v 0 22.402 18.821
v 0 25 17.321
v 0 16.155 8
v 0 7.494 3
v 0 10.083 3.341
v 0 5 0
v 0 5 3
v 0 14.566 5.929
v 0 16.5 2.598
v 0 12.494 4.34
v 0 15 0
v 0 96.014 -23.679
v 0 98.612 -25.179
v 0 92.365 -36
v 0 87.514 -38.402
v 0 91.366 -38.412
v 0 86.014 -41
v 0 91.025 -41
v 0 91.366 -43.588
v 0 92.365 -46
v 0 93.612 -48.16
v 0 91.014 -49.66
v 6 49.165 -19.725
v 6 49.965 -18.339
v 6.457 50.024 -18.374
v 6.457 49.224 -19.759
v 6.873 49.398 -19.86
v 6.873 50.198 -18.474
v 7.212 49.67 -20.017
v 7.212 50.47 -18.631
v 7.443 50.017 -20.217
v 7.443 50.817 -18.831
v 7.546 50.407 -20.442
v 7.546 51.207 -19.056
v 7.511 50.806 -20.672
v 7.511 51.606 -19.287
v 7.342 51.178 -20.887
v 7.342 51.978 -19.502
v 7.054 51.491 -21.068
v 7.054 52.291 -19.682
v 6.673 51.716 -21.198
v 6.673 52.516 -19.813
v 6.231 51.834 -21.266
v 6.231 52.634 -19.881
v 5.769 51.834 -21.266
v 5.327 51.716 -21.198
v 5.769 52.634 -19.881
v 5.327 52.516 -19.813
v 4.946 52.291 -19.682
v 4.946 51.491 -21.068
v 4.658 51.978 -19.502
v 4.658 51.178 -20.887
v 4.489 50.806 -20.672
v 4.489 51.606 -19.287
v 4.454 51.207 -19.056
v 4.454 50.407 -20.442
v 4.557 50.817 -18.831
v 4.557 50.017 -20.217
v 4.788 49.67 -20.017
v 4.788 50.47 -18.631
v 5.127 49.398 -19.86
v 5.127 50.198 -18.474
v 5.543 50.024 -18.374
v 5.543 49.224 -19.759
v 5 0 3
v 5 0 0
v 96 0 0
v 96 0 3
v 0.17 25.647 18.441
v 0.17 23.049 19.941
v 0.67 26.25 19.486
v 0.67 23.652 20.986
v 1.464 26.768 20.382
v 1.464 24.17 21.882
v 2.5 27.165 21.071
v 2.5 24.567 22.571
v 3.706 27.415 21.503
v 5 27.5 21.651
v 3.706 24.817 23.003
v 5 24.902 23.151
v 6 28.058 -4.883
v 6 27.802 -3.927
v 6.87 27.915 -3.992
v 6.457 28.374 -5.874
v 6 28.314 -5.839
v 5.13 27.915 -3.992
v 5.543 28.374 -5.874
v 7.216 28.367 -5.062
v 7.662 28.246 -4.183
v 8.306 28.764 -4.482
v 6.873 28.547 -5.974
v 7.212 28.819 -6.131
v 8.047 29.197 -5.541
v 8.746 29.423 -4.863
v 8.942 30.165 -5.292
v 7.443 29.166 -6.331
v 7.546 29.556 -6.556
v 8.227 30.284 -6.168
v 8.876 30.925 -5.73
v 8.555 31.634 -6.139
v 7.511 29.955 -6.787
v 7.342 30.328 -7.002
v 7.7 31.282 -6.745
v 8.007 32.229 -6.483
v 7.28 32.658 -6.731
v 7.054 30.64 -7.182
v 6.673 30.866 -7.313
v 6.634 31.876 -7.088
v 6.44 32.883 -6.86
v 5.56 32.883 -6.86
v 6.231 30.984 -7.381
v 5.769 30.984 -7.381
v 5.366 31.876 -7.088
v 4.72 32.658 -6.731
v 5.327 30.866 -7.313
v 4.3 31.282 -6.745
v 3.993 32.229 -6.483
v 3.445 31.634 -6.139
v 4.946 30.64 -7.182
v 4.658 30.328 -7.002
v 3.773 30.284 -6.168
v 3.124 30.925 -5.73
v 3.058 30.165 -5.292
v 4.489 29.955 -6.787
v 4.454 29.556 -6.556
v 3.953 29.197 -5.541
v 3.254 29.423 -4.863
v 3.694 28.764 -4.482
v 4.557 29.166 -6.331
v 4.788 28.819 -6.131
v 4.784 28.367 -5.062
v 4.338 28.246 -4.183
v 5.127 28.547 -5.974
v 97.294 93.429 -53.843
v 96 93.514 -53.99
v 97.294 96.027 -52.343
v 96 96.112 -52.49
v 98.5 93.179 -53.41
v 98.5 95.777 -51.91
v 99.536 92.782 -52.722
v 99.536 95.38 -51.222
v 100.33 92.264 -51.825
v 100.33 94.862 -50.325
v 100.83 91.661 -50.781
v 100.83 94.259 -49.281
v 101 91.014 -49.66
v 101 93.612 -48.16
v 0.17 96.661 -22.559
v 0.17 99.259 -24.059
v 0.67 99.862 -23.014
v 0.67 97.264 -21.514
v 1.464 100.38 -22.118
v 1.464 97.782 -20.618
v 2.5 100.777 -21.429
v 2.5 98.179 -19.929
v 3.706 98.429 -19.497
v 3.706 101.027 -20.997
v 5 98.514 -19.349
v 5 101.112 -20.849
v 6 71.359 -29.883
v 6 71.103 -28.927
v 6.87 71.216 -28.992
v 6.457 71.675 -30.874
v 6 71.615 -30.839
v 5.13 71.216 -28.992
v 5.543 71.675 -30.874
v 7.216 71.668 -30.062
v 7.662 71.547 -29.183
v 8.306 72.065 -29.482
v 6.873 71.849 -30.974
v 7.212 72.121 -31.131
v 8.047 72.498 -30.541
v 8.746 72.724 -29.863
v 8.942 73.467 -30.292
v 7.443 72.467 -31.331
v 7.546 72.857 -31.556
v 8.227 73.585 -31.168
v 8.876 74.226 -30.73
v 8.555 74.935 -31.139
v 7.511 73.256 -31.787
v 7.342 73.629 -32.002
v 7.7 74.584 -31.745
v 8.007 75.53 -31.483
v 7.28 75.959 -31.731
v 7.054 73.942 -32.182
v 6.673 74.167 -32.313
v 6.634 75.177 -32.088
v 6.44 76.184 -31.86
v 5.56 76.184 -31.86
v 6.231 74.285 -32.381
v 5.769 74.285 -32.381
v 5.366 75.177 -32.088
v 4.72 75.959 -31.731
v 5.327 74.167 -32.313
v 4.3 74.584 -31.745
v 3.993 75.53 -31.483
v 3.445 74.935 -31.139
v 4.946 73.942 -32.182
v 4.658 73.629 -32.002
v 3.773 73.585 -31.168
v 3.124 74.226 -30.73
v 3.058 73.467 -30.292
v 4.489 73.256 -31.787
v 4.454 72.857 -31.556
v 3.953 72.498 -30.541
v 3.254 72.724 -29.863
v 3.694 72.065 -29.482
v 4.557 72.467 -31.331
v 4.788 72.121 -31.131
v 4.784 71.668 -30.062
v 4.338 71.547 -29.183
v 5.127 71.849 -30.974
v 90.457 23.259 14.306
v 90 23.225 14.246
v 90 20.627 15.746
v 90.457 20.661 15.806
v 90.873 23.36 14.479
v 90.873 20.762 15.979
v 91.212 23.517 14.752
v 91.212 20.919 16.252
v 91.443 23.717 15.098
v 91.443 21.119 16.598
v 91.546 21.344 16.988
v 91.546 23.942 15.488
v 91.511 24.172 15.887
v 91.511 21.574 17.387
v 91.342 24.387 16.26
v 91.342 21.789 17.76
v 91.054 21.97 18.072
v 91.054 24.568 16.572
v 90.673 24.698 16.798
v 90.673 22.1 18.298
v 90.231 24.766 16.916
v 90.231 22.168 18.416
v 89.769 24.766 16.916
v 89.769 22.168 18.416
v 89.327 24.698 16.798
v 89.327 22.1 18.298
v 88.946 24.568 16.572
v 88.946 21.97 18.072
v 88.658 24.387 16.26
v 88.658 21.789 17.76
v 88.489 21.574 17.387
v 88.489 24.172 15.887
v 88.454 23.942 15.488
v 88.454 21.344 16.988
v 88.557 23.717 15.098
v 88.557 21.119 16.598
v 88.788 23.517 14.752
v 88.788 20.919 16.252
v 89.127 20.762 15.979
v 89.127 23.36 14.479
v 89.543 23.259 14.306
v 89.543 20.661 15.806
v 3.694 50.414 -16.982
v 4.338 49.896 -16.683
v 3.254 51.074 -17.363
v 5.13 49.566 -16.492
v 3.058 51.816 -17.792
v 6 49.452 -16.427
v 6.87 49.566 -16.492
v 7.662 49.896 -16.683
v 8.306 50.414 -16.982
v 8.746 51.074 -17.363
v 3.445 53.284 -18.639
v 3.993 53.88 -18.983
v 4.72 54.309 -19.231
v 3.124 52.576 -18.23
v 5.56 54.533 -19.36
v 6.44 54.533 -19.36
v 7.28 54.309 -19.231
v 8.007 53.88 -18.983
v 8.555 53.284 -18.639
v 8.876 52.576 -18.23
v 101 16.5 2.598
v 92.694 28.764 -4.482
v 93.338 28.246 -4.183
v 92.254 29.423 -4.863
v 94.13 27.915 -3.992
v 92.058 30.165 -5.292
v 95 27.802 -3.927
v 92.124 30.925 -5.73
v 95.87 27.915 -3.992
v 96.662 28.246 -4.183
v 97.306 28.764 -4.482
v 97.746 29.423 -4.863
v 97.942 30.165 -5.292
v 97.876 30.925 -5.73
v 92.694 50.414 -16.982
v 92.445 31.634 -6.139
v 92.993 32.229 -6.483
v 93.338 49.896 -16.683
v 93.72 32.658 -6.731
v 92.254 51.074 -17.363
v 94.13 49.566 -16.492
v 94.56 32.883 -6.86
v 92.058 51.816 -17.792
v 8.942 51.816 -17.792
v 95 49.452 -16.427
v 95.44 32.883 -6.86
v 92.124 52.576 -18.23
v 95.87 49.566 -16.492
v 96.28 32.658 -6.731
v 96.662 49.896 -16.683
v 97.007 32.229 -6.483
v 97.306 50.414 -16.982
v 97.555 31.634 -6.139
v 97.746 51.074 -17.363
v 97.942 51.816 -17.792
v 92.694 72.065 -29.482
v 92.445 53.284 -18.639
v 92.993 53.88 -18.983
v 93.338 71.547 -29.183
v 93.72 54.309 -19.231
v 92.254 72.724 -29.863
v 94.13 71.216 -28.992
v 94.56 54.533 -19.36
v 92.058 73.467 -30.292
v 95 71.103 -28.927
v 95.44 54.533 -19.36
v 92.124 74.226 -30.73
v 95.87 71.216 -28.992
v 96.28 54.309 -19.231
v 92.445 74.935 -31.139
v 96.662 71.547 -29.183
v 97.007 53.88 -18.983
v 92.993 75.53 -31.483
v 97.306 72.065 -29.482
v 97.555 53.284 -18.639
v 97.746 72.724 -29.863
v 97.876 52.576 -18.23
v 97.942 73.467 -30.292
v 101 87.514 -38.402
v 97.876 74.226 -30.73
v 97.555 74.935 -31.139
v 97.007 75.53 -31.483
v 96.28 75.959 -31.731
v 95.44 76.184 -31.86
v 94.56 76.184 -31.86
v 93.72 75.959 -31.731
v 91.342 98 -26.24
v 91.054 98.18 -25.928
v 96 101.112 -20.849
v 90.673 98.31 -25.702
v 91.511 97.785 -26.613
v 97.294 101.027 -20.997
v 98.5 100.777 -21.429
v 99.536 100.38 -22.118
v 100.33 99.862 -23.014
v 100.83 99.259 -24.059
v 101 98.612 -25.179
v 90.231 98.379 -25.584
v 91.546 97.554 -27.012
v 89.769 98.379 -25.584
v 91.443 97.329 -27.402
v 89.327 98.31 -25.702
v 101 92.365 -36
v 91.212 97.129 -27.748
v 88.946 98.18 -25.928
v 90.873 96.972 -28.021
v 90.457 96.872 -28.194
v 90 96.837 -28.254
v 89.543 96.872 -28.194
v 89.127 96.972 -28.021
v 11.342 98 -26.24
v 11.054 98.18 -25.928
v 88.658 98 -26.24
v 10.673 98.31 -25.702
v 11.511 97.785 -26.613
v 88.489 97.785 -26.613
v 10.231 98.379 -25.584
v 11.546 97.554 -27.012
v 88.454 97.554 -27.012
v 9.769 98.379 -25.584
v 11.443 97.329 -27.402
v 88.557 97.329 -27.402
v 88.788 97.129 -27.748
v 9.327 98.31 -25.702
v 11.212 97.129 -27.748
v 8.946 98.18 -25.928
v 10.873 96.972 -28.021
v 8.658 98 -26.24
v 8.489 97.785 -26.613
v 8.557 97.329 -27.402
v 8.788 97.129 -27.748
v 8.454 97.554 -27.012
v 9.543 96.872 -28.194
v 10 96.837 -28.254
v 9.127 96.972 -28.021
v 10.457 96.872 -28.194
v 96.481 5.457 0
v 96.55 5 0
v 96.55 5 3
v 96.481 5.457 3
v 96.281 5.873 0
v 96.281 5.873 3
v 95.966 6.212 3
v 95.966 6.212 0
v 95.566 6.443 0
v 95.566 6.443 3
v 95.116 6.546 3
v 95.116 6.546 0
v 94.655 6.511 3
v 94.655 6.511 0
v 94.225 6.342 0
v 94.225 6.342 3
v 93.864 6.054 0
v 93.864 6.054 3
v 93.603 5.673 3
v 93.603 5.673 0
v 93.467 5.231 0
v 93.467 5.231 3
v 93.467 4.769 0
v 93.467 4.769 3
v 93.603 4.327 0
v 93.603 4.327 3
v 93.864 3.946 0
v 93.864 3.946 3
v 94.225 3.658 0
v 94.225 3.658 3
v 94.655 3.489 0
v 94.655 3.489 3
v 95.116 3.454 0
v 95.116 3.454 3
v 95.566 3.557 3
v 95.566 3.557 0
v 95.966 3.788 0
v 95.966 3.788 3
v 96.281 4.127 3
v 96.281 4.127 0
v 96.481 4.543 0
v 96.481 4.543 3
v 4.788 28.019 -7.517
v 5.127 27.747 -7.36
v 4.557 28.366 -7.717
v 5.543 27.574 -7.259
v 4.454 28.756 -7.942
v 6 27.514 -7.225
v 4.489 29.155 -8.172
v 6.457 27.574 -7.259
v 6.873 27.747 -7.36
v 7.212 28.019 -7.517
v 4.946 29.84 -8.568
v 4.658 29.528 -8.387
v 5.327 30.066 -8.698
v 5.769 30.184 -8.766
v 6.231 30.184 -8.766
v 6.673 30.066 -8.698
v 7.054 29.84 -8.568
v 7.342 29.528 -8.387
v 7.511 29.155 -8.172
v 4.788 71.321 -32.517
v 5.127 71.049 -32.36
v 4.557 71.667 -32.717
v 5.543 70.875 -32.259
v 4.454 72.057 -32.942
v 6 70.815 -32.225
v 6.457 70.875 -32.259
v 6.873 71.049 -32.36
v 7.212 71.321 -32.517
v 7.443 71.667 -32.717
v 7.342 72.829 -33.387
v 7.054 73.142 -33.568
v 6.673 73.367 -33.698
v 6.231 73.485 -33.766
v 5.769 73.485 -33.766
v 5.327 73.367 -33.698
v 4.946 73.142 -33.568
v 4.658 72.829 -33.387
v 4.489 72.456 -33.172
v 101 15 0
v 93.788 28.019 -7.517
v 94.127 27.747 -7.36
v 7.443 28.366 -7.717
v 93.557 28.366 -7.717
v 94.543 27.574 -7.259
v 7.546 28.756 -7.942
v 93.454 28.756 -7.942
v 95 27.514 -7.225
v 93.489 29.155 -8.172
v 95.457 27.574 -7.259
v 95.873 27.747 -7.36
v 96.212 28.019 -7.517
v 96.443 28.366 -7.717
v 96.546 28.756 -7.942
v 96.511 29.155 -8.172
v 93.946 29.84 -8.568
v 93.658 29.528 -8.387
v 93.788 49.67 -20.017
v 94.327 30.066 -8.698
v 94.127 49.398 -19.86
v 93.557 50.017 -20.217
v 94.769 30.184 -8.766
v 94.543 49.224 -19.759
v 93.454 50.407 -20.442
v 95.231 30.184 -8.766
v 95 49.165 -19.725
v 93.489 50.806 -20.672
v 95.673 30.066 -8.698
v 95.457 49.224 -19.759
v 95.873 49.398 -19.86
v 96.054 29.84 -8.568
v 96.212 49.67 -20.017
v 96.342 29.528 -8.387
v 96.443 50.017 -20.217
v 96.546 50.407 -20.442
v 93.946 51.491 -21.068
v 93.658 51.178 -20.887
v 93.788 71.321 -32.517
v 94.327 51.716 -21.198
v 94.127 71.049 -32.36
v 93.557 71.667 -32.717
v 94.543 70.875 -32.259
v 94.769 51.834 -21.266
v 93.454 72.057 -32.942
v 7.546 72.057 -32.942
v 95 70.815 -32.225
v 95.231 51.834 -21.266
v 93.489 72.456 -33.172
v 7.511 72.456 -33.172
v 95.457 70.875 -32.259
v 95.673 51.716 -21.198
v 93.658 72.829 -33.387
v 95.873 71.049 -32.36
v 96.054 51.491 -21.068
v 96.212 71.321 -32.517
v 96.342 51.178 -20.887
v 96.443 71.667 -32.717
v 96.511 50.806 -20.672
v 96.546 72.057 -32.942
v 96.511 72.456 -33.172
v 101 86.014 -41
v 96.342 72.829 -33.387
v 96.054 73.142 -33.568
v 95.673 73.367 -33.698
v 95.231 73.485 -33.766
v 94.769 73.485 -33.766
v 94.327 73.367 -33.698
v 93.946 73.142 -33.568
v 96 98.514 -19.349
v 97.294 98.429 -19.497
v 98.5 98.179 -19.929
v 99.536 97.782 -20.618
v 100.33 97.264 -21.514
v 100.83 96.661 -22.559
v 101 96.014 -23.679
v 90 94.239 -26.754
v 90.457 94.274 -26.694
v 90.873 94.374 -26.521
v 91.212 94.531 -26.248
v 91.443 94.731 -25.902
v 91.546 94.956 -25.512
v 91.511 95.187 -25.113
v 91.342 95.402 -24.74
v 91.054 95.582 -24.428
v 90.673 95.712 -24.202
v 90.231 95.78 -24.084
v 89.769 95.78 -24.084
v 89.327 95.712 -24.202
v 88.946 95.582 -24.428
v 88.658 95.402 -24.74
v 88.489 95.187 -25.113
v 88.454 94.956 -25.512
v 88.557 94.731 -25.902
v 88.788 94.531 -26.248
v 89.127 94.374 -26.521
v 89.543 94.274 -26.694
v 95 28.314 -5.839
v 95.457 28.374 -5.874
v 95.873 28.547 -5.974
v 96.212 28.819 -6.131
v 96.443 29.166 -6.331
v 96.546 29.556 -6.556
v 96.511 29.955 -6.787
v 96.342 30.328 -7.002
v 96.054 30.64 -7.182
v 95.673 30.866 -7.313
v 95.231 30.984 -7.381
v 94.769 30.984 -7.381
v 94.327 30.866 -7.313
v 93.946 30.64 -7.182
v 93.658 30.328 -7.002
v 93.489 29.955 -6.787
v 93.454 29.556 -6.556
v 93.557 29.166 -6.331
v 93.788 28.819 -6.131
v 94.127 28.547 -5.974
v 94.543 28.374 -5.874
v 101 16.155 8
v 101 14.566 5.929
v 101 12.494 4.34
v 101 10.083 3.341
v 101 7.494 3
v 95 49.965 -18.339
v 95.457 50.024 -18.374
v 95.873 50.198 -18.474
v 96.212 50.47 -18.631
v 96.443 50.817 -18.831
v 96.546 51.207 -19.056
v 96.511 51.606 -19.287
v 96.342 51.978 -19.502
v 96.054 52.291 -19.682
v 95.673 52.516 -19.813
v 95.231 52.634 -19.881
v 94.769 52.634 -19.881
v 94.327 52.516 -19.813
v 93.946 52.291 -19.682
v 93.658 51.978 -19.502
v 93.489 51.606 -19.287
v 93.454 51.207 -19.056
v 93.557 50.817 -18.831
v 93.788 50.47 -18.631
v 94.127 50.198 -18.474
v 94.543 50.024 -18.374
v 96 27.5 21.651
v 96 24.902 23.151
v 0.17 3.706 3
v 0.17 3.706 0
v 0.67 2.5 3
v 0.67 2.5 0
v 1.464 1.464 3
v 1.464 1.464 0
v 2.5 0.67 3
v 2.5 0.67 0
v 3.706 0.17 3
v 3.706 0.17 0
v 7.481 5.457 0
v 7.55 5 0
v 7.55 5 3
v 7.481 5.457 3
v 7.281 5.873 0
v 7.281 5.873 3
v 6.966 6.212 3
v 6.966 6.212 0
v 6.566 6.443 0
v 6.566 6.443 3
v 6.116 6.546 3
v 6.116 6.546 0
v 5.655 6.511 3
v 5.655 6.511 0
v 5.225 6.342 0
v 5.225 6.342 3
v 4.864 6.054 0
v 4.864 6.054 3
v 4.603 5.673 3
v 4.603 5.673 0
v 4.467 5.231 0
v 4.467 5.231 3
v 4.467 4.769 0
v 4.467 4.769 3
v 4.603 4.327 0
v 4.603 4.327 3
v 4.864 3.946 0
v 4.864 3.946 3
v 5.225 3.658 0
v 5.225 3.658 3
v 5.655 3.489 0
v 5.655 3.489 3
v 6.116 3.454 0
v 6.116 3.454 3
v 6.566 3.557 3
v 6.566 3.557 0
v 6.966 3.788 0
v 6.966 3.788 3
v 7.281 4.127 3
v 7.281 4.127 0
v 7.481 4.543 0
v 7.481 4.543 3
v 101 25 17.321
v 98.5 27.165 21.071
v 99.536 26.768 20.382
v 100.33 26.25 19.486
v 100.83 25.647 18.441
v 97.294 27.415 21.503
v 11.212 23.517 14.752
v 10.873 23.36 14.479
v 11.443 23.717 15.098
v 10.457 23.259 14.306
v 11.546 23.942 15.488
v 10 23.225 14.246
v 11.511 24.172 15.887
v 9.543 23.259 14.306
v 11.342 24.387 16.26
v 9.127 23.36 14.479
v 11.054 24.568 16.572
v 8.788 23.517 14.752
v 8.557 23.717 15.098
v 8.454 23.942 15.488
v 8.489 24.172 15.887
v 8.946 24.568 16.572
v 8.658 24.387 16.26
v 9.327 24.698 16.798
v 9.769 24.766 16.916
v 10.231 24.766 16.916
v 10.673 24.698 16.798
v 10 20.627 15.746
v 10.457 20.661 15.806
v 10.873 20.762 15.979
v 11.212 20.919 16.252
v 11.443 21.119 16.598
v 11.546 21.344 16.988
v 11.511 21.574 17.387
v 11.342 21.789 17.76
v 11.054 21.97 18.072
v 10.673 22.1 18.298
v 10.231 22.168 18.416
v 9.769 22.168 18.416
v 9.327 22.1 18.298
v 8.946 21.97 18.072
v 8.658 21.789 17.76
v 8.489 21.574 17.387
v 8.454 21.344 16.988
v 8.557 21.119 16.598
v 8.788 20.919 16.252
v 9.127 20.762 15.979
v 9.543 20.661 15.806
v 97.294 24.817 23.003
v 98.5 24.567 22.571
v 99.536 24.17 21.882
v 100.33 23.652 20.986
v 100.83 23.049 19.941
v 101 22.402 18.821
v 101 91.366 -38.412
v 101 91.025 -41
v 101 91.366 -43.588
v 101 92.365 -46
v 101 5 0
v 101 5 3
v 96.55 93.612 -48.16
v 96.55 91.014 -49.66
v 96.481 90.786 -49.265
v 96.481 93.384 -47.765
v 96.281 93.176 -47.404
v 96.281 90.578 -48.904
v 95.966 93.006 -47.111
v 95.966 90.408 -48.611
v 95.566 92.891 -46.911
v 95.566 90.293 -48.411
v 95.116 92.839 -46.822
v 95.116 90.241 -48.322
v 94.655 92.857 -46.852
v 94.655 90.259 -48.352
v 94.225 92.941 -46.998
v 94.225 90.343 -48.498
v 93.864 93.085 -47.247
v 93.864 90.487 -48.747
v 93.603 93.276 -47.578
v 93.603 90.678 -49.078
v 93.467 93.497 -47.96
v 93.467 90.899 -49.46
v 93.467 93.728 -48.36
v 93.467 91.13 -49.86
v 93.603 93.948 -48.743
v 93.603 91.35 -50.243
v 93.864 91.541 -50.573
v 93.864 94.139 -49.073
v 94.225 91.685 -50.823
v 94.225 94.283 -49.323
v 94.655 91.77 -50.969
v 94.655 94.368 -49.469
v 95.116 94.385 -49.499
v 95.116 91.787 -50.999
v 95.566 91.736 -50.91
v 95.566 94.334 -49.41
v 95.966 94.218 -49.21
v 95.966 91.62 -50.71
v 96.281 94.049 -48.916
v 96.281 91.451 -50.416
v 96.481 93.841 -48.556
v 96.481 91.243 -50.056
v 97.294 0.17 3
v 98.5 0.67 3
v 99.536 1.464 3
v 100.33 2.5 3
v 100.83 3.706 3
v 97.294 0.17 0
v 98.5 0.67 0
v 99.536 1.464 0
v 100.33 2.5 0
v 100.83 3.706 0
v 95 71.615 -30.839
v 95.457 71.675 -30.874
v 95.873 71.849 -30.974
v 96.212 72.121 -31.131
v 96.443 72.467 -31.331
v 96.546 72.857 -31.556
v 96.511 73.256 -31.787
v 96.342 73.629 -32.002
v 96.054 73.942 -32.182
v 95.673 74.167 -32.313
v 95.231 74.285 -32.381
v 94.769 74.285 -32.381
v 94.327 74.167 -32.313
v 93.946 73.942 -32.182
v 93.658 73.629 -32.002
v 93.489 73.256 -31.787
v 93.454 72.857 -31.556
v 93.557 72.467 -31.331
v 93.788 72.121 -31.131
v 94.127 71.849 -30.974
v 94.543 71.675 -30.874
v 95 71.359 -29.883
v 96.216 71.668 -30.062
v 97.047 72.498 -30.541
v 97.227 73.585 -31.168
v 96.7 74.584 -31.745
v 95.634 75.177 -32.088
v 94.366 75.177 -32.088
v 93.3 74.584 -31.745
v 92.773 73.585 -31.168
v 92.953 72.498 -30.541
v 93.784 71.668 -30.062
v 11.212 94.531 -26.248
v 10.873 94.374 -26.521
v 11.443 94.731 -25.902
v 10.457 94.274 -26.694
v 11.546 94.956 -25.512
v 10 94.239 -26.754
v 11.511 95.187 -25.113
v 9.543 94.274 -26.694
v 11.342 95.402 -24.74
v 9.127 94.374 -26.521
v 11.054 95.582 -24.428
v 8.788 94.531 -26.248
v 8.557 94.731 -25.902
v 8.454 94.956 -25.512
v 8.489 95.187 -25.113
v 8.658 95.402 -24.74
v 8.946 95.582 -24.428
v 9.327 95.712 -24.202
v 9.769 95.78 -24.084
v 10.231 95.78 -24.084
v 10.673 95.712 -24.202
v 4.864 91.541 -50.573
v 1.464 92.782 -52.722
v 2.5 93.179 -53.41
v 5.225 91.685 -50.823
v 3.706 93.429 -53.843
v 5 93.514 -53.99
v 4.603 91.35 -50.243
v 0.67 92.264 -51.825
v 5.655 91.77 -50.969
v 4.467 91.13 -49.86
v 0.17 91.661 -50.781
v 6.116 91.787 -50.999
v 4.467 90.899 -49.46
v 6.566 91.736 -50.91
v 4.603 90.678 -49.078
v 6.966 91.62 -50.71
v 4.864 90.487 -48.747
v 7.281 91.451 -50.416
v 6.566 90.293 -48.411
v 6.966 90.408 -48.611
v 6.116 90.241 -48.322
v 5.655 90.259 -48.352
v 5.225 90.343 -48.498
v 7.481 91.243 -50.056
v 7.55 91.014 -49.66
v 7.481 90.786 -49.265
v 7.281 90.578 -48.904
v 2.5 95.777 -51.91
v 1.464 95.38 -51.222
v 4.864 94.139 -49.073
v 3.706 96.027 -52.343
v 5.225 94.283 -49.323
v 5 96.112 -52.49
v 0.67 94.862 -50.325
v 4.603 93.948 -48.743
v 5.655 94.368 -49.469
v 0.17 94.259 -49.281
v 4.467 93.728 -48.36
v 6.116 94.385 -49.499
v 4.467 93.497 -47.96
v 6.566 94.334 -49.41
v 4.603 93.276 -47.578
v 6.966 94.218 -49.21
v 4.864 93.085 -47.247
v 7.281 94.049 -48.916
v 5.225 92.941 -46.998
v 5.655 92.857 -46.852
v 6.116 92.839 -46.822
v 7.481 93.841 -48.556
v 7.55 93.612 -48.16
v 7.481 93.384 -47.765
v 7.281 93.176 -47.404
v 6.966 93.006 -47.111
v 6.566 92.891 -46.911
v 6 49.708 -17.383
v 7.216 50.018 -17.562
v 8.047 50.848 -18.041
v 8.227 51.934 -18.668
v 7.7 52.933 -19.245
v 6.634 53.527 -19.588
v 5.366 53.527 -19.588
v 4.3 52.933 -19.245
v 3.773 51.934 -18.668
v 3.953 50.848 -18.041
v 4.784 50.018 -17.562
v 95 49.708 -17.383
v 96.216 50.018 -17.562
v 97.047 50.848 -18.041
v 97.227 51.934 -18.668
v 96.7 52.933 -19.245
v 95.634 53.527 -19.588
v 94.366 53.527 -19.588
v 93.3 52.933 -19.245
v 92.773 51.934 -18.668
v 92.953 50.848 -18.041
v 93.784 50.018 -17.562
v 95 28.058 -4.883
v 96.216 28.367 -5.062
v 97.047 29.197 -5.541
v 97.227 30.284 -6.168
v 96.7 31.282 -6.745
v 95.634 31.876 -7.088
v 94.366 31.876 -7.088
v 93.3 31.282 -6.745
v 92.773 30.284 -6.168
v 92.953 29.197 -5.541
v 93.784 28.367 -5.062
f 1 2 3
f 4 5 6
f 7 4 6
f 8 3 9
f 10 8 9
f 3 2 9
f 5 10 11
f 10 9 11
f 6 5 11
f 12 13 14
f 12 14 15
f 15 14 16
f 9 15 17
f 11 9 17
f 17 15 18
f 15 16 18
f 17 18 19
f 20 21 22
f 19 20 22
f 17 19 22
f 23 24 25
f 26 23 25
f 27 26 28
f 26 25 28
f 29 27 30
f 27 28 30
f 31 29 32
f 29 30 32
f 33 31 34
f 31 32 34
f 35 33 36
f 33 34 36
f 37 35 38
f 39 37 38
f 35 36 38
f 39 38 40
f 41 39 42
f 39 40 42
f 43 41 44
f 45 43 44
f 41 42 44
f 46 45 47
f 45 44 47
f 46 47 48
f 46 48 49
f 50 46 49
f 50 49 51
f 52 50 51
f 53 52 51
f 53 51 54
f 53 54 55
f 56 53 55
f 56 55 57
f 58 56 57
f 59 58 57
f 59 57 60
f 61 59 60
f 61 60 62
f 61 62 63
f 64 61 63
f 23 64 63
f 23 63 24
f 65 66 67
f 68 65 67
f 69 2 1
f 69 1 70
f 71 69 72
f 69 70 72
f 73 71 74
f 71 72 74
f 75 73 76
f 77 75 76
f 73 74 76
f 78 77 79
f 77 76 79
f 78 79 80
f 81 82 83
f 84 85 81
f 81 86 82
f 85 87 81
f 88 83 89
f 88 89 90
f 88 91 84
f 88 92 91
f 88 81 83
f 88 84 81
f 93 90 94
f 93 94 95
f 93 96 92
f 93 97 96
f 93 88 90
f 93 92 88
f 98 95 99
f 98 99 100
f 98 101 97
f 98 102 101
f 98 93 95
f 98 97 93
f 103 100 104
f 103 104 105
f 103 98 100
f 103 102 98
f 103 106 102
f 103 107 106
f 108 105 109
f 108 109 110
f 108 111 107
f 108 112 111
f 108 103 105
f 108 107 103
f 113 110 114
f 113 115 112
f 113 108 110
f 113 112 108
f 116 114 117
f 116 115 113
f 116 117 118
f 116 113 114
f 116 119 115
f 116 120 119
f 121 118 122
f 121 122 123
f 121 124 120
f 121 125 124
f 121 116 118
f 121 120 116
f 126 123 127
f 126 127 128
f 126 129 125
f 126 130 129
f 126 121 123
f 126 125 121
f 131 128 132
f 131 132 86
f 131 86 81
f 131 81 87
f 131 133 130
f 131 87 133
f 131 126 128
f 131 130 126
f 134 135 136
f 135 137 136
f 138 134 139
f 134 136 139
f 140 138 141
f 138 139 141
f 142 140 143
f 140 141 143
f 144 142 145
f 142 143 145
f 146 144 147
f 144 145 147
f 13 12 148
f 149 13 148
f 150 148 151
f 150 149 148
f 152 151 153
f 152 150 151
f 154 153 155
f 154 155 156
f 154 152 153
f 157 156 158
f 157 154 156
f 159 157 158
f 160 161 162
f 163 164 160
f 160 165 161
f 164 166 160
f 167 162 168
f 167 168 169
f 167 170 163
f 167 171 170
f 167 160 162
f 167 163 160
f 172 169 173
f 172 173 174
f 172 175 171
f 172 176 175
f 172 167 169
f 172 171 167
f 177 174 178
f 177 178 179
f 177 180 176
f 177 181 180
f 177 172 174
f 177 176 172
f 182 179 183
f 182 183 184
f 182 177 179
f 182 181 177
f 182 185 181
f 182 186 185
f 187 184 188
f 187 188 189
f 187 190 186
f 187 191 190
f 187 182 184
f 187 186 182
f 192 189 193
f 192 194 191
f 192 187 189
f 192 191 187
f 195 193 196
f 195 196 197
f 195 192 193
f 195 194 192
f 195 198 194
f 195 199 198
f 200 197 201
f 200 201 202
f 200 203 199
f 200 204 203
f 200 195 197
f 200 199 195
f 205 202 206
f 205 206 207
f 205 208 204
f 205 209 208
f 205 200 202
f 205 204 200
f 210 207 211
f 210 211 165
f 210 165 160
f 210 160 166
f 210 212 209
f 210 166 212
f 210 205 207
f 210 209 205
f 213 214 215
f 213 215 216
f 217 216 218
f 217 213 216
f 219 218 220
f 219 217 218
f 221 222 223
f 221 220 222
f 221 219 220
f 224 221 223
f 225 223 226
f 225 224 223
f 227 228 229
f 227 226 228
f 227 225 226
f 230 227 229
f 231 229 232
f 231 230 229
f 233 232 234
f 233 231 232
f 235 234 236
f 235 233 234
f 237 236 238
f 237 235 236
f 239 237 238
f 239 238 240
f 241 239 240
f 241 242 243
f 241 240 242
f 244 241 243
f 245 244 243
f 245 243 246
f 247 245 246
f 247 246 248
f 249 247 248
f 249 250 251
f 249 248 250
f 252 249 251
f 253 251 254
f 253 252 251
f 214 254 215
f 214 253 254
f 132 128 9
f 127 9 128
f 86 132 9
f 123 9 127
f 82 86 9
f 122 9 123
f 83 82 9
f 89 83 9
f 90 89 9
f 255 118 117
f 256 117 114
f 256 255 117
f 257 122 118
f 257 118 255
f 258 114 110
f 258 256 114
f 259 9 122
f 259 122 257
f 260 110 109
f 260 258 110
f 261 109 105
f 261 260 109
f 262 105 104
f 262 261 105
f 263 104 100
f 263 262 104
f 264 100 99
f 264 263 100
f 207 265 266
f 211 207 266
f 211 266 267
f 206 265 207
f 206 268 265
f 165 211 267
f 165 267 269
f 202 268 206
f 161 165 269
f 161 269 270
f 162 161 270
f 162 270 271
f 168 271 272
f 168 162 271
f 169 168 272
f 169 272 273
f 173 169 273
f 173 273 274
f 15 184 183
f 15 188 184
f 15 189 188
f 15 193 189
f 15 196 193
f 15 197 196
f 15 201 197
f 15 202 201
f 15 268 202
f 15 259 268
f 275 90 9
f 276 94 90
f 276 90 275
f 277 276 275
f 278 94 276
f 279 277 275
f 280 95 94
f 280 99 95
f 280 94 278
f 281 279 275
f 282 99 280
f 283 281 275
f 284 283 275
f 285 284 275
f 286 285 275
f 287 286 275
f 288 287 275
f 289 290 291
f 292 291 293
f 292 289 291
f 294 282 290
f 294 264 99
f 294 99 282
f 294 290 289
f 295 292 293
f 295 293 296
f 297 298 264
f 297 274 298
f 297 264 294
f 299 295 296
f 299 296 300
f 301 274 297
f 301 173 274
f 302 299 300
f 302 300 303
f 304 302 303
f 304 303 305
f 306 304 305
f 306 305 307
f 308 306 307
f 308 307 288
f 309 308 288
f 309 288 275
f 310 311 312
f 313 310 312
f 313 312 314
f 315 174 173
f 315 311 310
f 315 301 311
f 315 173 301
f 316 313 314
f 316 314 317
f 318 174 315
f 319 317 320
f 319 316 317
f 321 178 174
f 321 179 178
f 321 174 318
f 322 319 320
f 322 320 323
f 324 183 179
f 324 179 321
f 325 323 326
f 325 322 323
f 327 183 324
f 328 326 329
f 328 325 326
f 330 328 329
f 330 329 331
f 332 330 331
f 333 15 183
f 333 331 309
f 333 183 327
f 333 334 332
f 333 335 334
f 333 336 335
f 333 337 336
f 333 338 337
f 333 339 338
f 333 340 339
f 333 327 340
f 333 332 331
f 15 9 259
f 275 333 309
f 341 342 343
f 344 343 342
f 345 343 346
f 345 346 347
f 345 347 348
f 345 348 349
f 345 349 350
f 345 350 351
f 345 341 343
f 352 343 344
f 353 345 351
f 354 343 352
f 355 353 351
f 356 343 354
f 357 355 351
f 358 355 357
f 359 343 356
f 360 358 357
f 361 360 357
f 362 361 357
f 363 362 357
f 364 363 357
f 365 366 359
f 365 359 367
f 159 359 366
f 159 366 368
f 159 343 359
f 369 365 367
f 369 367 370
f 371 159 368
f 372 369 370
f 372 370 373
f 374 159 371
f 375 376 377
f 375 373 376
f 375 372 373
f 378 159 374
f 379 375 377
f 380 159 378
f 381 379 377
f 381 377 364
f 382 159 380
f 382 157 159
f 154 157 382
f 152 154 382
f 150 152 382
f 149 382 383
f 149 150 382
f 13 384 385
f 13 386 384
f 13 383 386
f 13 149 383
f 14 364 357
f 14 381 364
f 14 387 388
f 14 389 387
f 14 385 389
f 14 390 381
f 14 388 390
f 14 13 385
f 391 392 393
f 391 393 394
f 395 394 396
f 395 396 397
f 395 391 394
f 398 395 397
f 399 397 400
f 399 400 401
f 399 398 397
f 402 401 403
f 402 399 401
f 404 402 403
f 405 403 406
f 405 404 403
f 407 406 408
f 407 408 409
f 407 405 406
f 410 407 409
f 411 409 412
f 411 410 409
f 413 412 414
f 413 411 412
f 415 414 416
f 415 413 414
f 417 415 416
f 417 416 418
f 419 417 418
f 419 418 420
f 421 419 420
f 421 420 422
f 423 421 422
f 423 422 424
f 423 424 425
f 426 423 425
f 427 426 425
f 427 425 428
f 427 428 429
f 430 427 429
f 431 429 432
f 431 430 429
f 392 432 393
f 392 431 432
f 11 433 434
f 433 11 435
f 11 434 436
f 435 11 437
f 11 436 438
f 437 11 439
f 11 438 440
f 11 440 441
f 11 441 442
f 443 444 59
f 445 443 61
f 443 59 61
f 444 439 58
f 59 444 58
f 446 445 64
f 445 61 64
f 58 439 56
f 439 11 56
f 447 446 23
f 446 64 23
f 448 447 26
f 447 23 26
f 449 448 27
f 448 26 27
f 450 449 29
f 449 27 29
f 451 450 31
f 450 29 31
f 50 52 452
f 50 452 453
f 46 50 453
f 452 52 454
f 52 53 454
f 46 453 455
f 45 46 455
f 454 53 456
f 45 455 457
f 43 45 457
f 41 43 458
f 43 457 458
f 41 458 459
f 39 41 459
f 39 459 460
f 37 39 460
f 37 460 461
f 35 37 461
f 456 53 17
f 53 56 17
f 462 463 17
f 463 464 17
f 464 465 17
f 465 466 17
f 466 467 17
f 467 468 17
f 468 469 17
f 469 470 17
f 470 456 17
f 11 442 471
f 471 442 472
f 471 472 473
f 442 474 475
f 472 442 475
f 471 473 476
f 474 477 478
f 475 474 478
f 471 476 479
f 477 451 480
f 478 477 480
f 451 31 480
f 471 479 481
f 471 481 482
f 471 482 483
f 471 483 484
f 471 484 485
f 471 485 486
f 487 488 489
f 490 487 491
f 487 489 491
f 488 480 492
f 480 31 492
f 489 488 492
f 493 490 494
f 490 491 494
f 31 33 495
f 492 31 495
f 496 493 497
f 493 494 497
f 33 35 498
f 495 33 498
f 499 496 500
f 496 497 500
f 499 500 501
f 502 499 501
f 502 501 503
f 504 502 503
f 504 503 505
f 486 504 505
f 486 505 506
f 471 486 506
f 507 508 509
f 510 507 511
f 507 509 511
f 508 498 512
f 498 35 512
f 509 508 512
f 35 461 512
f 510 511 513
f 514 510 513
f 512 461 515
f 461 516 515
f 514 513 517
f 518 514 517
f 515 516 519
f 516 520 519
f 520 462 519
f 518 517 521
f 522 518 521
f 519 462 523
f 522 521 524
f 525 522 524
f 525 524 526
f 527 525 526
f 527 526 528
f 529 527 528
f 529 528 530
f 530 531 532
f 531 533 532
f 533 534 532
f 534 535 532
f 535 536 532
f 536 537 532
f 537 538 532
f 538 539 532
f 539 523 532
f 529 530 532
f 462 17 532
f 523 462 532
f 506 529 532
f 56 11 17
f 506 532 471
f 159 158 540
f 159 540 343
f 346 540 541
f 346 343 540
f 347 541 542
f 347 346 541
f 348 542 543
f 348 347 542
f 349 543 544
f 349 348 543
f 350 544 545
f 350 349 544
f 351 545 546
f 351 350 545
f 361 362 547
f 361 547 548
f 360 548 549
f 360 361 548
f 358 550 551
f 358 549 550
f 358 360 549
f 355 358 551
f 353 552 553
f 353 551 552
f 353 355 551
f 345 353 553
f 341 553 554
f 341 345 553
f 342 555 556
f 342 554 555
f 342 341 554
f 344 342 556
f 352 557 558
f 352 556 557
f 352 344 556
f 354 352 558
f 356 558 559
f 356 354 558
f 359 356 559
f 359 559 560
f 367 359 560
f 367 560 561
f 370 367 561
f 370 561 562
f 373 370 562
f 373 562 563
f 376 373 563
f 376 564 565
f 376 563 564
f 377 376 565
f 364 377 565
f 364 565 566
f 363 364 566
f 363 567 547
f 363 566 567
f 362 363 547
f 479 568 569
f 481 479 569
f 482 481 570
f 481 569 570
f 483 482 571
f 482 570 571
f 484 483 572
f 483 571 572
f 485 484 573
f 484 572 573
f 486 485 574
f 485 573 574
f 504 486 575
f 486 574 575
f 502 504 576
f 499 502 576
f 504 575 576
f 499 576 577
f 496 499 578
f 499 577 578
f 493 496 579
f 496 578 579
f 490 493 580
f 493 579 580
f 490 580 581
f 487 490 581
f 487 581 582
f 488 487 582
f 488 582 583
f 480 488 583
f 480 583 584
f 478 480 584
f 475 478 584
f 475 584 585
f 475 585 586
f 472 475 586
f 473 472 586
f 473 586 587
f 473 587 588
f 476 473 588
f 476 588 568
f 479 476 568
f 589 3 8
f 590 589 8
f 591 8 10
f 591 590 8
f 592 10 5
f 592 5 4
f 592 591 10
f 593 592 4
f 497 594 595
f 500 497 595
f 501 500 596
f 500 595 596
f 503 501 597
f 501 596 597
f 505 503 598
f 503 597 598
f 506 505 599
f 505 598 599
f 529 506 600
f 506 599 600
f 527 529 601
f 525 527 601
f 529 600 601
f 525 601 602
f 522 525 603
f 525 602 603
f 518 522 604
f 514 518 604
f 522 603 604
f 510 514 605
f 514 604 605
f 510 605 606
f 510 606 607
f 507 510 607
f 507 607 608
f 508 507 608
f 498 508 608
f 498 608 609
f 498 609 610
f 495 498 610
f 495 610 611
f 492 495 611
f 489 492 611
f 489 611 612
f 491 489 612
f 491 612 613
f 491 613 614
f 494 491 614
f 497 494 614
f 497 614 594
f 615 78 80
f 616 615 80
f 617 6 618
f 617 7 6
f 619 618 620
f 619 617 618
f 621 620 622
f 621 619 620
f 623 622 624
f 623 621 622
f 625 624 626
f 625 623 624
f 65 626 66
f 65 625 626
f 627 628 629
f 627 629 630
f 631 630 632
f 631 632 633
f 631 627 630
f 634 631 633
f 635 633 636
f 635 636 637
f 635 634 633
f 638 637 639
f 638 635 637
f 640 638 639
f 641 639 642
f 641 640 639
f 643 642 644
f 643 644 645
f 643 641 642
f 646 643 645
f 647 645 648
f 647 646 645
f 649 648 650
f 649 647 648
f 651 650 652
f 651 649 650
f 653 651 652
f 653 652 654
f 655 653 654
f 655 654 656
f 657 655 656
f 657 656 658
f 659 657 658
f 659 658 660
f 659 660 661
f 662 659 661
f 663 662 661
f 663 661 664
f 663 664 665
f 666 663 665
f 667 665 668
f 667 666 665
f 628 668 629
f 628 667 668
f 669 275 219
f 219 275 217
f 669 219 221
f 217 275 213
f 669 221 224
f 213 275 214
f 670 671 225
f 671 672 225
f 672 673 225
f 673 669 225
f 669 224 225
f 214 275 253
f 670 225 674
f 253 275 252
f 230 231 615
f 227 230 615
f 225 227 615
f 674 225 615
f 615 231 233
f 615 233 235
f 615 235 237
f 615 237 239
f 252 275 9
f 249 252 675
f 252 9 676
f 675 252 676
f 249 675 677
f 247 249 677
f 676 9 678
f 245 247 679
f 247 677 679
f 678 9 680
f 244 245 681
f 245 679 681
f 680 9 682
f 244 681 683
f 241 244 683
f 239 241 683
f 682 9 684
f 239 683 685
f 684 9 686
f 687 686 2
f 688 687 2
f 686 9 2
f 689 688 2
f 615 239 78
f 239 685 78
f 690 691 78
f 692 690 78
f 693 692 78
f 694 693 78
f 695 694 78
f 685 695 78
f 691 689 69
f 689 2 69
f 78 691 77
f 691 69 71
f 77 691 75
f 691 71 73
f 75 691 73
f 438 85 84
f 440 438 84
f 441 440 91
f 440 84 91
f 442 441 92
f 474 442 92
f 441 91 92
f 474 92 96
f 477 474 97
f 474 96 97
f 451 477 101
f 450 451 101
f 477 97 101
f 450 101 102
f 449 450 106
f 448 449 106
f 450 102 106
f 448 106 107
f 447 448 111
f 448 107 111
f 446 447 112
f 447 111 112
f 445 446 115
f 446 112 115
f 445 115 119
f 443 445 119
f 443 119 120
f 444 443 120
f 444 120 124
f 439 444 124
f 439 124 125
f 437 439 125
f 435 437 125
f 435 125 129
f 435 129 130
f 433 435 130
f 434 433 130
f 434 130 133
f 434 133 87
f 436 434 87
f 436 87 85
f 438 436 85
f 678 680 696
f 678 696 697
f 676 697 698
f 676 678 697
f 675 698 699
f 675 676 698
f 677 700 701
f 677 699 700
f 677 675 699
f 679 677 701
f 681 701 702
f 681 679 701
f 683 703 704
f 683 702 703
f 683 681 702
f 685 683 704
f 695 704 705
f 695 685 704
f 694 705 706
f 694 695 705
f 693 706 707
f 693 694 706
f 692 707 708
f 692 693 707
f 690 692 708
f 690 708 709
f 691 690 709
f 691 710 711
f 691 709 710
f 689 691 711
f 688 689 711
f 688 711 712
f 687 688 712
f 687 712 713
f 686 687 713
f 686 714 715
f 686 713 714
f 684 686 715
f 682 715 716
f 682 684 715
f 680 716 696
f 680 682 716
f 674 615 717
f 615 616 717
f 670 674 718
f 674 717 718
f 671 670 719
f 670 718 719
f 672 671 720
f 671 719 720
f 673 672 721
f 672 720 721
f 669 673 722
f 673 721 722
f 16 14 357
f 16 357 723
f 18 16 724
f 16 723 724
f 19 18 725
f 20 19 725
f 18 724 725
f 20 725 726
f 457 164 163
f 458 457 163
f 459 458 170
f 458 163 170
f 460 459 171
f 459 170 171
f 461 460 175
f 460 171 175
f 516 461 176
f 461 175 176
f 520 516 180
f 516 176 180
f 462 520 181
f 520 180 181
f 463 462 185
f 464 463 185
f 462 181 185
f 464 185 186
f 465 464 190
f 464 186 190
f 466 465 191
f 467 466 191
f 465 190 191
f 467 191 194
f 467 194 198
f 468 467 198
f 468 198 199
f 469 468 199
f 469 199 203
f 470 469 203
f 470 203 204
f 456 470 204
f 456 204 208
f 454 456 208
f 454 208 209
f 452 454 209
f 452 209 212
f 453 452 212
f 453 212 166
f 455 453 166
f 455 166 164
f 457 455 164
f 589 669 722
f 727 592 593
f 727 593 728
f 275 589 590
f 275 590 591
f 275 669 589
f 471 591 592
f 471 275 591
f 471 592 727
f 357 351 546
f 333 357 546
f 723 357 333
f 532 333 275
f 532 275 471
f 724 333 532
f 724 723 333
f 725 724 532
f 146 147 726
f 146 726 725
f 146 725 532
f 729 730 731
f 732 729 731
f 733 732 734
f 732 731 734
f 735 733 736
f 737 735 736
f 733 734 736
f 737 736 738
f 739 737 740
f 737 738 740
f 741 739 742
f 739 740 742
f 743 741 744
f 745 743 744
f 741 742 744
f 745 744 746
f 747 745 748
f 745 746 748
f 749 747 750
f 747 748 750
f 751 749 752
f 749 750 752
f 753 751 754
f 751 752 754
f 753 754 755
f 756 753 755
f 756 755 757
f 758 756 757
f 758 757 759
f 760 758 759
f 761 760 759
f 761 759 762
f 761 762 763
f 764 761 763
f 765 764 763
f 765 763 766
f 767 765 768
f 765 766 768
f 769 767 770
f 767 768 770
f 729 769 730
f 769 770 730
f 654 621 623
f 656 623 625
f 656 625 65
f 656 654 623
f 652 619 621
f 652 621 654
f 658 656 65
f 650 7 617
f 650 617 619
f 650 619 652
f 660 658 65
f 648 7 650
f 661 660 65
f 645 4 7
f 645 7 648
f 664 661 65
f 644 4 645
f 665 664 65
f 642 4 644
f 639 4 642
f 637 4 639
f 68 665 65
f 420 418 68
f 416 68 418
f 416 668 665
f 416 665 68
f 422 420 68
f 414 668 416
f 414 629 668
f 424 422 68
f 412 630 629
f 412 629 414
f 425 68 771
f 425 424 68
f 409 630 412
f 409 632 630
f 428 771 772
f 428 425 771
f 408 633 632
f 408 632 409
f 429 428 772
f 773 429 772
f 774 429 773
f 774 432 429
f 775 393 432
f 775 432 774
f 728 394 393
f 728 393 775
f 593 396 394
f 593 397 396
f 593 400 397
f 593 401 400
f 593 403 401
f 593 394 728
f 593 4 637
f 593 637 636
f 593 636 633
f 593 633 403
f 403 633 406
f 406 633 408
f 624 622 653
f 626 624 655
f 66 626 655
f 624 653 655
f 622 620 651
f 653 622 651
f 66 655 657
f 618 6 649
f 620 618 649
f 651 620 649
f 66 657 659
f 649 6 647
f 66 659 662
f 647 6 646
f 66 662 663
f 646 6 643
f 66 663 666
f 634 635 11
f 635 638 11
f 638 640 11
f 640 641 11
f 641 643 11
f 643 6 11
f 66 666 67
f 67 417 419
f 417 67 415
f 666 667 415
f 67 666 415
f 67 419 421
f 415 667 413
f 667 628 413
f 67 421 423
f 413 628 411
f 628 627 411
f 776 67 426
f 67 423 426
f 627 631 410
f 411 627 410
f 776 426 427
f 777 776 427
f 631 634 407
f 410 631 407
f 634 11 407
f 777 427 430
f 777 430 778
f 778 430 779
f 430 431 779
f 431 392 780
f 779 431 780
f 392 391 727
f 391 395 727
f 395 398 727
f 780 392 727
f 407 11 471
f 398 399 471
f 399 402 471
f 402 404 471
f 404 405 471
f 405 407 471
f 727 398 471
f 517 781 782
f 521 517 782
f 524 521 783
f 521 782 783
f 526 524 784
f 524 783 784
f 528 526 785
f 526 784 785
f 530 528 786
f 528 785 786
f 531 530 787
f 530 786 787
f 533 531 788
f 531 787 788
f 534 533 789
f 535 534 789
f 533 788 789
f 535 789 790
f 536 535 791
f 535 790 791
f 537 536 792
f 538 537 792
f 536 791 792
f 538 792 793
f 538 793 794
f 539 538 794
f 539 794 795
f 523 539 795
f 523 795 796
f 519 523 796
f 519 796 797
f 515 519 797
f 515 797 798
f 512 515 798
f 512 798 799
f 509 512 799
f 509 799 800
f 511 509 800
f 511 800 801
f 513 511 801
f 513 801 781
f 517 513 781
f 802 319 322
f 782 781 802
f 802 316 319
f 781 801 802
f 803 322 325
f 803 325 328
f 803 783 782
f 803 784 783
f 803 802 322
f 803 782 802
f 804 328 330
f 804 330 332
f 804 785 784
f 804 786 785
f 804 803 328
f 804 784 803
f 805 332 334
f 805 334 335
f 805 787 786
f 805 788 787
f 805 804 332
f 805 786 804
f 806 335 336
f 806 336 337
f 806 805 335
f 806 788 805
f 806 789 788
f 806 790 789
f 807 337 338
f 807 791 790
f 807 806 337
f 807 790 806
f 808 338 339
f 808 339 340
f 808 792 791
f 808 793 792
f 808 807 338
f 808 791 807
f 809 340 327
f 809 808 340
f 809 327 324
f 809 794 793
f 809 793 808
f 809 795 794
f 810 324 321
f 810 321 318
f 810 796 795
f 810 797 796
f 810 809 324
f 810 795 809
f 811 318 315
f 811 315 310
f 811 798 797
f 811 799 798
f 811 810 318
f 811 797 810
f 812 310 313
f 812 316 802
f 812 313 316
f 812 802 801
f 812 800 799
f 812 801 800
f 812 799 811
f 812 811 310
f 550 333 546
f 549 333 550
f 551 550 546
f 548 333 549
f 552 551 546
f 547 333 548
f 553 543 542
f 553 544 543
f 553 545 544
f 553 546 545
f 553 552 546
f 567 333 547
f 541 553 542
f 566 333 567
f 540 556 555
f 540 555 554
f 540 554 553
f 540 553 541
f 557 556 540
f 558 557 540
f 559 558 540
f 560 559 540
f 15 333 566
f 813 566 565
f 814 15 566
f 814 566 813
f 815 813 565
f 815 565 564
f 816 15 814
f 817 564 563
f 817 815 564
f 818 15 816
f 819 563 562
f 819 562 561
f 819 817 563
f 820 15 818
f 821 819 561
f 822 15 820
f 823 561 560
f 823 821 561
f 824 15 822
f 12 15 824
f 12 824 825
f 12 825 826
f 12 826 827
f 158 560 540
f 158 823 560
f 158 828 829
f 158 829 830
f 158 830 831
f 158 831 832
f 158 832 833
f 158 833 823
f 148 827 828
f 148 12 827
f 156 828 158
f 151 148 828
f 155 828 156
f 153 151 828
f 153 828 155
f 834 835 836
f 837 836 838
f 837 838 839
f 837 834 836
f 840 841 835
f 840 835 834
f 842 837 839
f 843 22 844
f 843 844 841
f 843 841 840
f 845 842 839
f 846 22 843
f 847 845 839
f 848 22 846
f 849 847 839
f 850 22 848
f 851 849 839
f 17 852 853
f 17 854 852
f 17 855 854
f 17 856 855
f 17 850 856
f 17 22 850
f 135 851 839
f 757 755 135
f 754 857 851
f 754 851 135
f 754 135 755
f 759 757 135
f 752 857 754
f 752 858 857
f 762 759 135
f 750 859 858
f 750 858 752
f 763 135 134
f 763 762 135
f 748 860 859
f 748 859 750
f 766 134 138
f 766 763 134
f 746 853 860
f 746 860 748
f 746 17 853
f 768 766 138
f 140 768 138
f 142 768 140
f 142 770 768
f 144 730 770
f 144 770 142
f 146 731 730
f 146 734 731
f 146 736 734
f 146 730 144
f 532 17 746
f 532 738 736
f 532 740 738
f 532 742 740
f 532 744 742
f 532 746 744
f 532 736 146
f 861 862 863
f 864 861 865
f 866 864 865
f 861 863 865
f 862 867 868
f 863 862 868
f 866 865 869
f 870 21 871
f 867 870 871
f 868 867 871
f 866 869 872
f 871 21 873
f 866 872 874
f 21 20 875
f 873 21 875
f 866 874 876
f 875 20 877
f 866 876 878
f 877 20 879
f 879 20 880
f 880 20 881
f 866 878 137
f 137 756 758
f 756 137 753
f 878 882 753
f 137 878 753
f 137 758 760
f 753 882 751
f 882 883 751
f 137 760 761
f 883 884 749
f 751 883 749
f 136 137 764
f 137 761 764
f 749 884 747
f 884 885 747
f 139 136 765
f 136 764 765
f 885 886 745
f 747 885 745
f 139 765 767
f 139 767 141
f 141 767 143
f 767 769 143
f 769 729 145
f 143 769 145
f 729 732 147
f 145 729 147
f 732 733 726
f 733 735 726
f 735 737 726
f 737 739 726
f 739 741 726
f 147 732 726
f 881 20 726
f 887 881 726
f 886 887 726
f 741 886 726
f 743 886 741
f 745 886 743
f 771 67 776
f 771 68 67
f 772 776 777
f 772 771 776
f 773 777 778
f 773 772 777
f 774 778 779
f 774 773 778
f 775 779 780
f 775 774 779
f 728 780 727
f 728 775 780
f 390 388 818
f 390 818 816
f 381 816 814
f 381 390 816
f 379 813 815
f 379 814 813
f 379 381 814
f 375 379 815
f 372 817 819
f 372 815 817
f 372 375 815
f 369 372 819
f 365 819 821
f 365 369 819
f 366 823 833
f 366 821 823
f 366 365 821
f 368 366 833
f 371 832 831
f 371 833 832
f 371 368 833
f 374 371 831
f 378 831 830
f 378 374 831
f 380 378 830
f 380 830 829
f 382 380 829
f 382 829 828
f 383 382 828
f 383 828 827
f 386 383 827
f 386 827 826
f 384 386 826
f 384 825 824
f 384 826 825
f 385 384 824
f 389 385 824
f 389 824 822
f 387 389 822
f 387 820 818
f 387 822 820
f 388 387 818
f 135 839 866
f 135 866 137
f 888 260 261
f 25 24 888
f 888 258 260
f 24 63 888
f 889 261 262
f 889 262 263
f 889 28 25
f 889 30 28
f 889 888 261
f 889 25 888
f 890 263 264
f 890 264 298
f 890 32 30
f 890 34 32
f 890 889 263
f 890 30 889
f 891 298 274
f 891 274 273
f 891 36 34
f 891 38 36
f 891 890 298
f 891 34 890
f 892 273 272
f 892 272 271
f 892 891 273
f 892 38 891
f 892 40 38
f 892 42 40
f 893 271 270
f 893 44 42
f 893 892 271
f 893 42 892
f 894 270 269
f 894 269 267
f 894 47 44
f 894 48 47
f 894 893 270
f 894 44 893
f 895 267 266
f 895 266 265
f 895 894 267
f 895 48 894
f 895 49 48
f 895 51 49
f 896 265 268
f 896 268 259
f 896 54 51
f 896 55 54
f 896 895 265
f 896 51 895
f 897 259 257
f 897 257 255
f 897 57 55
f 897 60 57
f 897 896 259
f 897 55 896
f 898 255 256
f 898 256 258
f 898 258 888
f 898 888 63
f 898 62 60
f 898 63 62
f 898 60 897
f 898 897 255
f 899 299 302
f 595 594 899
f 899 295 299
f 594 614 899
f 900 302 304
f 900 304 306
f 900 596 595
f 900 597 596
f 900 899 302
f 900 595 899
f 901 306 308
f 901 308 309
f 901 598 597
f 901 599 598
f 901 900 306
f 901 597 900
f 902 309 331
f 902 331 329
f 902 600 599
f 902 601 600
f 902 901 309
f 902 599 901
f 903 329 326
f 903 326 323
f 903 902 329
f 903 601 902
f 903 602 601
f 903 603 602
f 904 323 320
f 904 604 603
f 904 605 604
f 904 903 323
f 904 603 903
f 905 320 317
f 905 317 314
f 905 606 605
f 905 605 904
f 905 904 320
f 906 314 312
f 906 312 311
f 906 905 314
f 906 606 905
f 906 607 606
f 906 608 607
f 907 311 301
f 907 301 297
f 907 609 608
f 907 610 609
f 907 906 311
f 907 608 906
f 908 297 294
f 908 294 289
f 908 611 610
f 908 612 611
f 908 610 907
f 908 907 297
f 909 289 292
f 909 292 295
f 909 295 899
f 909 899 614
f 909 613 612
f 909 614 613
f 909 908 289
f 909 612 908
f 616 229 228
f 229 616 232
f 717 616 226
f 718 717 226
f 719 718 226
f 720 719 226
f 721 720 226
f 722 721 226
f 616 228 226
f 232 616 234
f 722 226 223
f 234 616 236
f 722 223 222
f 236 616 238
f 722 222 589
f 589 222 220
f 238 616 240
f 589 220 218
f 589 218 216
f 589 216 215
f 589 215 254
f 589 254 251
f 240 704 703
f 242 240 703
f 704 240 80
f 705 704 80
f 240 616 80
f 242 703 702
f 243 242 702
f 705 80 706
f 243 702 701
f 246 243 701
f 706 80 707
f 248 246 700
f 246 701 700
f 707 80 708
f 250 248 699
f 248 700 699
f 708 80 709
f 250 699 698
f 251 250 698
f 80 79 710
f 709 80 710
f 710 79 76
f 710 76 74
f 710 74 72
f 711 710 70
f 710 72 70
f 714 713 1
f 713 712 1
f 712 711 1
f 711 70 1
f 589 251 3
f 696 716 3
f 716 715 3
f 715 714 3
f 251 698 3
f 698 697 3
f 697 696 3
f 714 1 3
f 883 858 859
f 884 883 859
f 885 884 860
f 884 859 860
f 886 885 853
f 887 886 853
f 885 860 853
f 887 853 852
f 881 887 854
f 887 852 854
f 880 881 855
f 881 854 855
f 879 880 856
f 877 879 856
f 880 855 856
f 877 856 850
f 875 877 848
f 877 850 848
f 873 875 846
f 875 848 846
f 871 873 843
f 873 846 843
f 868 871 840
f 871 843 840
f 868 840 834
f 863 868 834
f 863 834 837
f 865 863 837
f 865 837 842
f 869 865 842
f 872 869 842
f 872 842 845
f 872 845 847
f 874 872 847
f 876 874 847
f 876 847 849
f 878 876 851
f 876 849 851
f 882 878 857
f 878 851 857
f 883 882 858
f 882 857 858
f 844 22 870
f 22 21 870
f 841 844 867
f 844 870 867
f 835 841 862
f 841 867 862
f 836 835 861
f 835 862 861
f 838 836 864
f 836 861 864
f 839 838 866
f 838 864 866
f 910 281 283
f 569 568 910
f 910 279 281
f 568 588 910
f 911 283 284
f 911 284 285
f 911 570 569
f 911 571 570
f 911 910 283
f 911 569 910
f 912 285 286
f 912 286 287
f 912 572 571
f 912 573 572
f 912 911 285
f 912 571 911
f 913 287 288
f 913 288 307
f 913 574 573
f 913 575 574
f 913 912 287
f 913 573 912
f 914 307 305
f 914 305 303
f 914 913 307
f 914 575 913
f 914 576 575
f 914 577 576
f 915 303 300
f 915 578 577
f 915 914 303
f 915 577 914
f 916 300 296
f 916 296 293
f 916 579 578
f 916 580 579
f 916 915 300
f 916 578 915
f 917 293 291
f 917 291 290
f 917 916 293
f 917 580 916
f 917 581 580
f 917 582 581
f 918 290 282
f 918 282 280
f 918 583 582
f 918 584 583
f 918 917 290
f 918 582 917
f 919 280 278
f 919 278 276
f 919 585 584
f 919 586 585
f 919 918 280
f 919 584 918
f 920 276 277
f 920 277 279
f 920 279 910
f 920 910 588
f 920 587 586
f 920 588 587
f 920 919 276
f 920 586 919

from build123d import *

# Parameters (mm, degrees)
SKETCH_1_W               = 101
SKETCH_1_H               = 15
SKETCH_1_R               = 1.55
EXTRUDE_1_DEPTH          = 3
EXTRUDE_2_DEPTH          = 101
FILLET_1_R               = 10
FILLET_2_R               = 5
SKETCH_3_W               = 101
SKETCH_3_H               = 3
EXTRUDE_3_DEPTH          = 41
SKETCH_4_R               = 1.55
CUT_EXTRUDE_1_DEPTH      = 153.872823645
CUT_EXTRUDE_2_DEPTH      = 149.186409795
CUT_EXTRUDE_2_DEPTH_BACK = 10
SKETCH_5_R               = 1.55
CHAMFER_1_SIZE           = 1.4


with BuildPart() as part:
    # 草图1 → 凸台-拉伸1 (new body)
    with BuildSketch(Plane.XY):
        with Locations((50.5, 7.5)):
            Rectangle(SKETCH_1_W, SKETCH_1_H)
        with Locations((6, 5)):
            Circle(SKETCH_1_R, mode=Mode.SUBTRACT)
        with Locations((95, 5)):
            Circle(SKETCH_1_R, mode=Mode.SUBTRACT)
    extrude(amount=EXTRUDE_1_DEPTH)

    # 草图2 → 凸台-拉伸2 (add)
    with BuildSketch(Plane.ZY):
        Polygon((0, 15), (21.650635095, 27.5), (23.150635095, 24.901923789), (3, 13.267949192), align=None)
    extrude(amount=-EXTRUDE_2_DEPTH)

    # 圆角1
    fillet_1_edges = [part.edges().sort_by_distance(p)[0] for p in [
        (50.5, 13.267949192, 3),
    ]]
    fillet(fillet_1_edges, radius=FILLET_1_R)

    # 圆角2
    fillet_2_edges = [part.edges().sort_by_distance(p)[0] for p in [
        (0, 26.200961894, 22.400635095),
        (101, 26.200961894, 22.400635095),
        (101, 0, 1.5),
        (0, 0, 1.5),
    ]]
    fillet(fillet_2_edges, radius=FILLET_2_R)

    # 草图3 → 凸台-拉伸3 (add)
    with BuildSketch(Plane(origin=(0, 11.25, -6.495190528), x_dir=(1, 0, 0), z_dir=(0, 0.8660254037844364, -0.5000000000000041))):
        with Locations((50.5, -9)):
            Rectangle(SKETCH_3_W, SKETCH_3_H)
    extrude(amount=EXTRUDE_3_DEPTH)

    # 镜向3: part across plane


with BuildPart() as part_1:
    add(part.part)
    add(part.part.mirror(Plane(origin=(0, 46.757041555, -26.995190528), x_dir=(0, 0.500000000000004, 0.8660254037844362), z_dir=(0, 0.8660254037844363, -0.5000000000000041))))

    # 草图4 → 切除-拉伸1 (cut, through all)
    with BuildSketch(Plane(origin=(0, 5.25, 9.09326674), x_dir=(1, 0, 0), z_dir=(0, 0.5000000000000041, 0.8660254037844364))):
        with Locations(Location((6, 78.990381057, 0), (0, 0, 270))):
            Circle(SKETCH_4_R)
        with Locations(Location((6, 53.990381057, 0), (0, 0, 270))):
            Circle(SKETCH_4_R)
        with Locations(Location((6, 28.990381057, 0), (0, 0, 270))):
            Circle(SKETCH_4_R)
        with Locations(Location((95, 78.990381057, 0), (0, 0, 270))):
            Circle(SKETCH_4_R)
        with Locations(Location((95, 53.990381057, 0), (0, 0, 270))):
            Circle(SKETCH_4_R)
        with Locations(Location((95, 28.990381057, 0), (0, 0, 270))):
            Circle(SKETCH_4_R)
    extrude(amount=-CUT_EXTRUDE_1_DEPTH, mode=Mode.SUBTRACT)

    # 草图5 → 切除-拉伸2 (cut, two sides: drawn at the far end of the back side and taken through both)
    with BuildSketch(Plane(origin=(0, 82.26408311, -47.495190528), x_dir=(1, 0, 0), z_dir=(0, -0.8660254037844376, 0.500000000000002)).offset(-CUT_EXTRUDE_2_DEPTH_BACK)):
        with Locations(Location((10, 25.5, 0), (0, 0, 270))):
            Circle(SKETCH_5_R)
        with Locations(Location((90, 25.5, 0), (0, 0, 270))):
            Circle(SKETCH_5_R)
    extrude(amount=CUT_EXTRUDE_2_DEPTH + CUT_EXTRUDE_2_DEPTH_BACK, mode=Mode.SUBTRACT)

    # 倒角1
    chamfer_1_edges = [part_1.edges().sort_by_distance(p)[0] for p in [
        (6, 31.698745836, -6.176923789),
        (6, 53.349380931, -18.676923789),
        (95, 53.349380931, -18.676923789),
        (95, 75.000016026, -31.176923789),
        (95, 31.698745836, -6.176923789),
        (6, 75.000016026, -31.176923789),
    ]]
    chamfer(chamfer_1_edges, length=CHAMFER_1_SIZE)


solid = part_1.part
